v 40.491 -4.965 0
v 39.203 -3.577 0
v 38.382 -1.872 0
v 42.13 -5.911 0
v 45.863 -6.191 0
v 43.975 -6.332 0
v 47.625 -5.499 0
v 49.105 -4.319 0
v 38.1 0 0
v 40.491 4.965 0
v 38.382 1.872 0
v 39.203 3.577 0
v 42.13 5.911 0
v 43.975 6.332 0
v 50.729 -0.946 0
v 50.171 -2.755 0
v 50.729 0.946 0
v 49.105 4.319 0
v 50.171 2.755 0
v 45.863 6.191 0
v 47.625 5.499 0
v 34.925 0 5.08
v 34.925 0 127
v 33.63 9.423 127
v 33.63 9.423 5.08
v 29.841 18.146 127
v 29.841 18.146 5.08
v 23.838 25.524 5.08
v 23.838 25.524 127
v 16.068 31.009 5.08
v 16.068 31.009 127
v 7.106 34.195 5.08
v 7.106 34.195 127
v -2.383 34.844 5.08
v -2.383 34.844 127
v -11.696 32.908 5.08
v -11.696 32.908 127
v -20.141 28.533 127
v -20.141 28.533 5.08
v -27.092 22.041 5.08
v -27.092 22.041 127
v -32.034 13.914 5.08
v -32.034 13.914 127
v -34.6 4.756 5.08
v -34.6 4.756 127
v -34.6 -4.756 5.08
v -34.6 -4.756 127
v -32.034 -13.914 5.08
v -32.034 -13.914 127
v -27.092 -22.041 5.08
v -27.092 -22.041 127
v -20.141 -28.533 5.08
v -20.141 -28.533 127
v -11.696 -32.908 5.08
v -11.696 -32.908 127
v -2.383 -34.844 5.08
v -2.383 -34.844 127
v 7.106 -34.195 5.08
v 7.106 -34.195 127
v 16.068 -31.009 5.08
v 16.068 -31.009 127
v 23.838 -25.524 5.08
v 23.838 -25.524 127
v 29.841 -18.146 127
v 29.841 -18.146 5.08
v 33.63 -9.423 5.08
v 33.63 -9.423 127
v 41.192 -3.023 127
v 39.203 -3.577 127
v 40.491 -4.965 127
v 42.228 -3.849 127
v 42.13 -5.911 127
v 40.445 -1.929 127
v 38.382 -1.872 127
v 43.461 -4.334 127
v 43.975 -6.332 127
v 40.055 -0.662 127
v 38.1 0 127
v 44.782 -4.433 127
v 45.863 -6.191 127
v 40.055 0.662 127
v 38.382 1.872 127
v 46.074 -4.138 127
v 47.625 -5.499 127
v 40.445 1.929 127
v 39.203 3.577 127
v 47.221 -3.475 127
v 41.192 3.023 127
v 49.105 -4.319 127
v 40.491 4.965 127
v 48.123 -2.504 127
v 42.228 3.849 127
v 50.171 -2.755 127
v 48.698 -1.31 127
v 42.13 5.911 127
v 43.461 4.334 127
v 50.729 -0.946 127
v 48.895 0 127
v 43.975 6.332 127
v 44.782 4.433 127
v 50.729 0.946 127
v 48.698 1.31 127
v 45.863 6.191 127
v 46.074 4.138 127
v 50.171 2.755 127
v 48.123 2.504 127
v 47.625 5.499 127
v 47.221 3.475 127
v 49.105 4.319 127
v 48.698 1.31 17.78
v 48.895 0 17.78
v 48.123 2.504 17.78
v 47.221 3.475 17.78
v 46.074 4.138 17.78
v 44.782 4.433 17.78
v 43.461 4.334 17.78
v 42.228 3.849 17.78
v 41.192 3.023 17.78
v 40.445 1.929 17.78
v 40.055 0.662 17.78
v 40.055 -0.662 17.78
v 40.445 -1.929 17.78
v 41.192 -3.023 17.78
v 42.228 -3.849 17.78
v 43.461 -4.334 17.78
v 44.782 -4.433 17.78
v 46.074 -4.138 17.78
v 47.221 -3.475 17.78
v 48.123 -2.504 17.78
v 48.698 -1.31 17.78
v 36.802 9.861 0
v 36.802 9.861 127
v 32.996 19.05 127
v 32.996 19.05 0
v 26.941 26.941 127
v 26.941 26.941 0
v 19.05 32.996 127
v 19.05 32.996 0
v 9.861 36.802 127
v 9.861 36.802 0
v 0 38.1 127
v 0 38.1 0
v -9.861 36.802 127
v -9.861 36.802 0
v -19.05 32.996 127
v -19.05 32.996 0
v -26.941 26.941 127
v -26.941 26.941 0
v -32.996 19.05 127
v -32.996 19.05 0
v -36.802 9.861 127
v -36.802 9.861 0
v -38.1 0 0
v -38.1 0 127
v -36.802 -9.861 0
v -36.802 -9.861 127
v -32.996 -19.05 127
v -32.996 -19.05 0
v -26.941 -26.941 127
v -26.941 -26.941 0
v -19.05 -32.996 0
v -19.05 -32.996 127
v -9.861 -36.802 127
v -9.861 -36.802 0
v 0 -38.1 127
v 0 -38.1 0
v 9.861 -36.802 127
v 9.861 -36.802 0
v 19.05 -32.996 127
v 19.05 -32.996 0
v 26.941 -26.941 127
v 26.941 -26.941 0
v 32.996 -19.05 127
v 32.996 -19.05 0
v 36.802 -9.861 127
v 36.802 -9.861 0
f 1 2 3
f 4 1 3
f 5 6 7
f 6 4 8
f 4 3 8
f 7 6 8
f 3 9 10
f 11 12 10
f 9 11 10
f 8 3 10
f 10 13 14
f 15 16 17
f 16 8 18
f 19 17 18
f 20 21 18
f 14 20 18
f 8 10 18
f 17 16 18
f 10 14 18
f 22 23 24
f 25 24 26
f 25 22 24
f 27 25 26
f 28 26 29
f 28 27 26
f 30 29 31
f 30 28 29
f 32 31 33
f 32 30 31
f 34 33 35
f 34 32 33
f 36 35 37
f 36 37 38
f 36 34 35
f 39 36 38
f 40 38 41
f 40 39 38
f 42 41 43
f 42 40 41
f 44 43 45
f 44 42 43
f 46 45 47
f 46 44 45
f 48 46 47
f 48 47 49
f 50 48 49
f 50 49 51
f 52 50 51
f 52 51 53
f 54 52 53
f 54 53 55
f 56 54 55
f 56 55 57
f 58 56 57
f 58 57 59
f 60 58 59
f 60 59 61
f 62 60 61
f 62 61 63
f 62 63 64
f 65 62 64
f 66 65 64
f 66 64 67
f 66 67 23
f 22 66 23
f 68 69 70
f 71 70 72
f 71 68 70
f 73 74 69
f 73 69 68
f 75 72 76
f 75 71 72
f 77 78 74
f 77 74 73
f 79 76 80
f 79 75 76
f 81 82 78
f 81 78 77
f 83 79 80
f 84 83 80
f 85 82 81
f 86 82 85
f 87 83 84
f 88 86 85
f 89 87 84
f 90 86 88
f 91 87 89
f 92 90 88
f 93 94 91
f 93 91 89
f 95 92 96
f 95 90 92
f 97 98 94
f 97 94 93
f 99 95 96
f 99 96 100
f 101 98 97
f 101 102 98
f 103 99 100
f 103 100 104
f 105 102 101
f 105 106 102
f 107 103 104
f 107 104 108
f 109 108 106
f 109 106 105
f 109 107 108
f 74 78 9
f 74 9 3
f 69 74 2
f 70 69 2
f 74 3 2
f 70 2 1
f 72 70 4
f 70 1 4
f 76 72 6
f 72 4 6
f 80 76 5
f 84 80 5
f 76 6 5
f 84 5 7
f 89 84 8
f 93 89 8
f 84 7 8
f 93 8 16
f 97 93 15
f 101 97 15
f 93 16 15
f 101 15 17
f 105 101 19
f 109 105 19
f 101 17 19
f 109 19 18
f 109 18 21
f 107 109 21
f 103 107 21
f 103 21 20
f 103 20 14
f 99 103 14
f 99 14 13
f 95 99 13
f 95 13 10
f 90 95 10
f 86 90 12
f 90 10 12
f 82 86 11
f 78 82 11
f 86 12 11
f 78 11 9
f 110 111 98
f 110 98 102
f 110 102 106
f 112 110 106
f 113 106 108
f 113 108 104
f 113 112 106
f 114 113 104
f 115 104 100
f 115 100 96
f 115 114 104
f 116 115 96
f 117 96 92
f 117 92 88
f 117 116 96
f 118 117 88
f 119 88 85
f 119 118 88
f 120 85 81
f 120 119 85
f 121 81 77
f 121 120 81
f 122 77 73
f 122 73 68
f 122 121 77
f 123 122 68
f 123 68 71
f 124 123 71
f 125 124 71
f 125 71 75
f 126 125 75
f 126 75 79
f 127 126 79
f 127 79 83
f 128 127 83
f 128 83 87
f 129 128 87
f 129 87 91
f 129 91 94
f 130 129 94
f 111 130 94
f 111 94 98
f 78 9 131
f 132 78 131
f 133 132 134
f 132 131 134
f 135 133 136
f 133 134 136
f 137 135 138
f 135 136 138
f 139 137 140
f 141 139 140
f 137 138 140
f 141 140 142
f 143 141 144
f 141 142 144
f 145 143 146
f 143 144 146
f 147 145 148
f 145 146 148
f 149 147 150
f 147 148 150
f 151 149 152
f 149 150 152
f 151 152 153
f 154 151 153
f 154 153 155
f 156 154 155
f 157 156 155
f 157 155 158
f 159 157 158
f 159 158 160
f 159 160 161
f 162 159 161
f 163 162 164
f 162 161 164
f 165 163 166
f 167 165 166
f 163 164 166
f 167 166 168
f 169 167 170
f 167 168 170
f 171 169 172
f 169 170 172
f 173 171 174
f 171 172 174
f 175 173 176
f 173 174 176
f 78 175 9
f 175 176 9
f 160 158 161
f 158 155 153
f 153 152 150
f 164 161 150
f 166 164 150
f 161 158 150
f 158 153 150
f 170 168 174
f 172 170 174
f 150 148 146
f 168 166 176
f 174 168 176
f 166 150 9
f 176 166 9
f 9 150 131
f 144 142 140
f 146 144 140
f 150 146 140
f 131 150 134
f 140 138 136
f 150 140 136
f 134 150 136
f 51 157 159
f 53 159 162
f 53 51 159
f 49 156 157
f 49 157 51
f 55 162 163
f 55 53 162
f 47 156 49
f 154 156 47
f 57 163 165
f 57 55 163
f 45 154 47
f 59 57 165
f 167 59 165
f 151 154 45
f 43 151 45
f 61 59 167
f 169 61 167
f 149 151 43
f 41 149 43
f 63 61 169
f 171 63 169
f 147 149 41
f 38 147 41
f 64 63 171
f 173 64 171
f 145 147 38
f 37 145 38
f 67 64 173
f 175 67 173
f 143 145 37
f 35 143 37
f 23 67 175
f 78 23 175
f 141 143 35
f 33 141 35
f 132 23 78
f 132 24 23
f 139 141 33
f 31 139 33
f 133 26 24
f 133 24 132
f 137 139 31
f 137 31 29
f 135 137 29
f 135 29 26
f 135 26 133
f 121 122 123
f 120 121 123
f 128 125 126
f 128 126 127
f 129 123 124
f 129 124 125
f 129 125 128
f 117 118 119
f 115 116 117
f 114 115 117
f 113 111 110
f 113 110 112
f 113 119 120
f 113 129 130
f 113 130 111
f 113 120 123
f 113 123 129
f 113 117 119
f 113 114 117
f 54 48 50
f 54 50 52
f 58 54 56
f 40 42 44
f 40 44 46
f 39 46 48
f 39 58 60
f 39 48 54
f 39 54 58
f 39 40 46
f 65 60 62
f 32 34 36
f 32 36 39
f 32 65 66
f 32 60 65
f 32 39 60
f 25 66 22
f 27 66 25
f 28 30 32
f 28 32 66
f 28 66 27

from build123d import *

# Parameters (mm, degrees)
F0_R     = 38.1
F0_R_2   = 34.925
F0_R_3   = 4.445
F1_DEPTH = 127
F2_DEPTH = 5.08
F3_DEPTH = 17.78


with BuildPart() as f1:
    # F0 (on Top) → F1 (new body)
    with BuildSketch(Plane.XY):
        Circle(F0_R)
        Circle(F0_R_2, mode=Mode.SUBTRACT)
        with BuildLine():
            ThreePointArc((50.8, 0), (44.45, 6.35), (38.1, 0))
            ThreePointArc((38.1, 0), (44.45, -6.35), (50.8, 0))
        make_face()
        with Locations((44.45, 0)):
            Circle(F0_R_3, mode=Mode.SUBTRACT)
    extrude(amount=F1_DEPTH)

    # F0 (on Top) → F2 (join)
    with BuildSketch(Plane.XY):
        Circle(F0_R_2)
    extrude(amount=F2_DEPTH)

    # F0 (on Top) → F3 (join)
    with BuildSketch(Plane.XY):
        with Locations((44.45, 0)):
            Circle(F0_R_3)
    extrude(amount=F3_DEPTH)


solid = f1.part
